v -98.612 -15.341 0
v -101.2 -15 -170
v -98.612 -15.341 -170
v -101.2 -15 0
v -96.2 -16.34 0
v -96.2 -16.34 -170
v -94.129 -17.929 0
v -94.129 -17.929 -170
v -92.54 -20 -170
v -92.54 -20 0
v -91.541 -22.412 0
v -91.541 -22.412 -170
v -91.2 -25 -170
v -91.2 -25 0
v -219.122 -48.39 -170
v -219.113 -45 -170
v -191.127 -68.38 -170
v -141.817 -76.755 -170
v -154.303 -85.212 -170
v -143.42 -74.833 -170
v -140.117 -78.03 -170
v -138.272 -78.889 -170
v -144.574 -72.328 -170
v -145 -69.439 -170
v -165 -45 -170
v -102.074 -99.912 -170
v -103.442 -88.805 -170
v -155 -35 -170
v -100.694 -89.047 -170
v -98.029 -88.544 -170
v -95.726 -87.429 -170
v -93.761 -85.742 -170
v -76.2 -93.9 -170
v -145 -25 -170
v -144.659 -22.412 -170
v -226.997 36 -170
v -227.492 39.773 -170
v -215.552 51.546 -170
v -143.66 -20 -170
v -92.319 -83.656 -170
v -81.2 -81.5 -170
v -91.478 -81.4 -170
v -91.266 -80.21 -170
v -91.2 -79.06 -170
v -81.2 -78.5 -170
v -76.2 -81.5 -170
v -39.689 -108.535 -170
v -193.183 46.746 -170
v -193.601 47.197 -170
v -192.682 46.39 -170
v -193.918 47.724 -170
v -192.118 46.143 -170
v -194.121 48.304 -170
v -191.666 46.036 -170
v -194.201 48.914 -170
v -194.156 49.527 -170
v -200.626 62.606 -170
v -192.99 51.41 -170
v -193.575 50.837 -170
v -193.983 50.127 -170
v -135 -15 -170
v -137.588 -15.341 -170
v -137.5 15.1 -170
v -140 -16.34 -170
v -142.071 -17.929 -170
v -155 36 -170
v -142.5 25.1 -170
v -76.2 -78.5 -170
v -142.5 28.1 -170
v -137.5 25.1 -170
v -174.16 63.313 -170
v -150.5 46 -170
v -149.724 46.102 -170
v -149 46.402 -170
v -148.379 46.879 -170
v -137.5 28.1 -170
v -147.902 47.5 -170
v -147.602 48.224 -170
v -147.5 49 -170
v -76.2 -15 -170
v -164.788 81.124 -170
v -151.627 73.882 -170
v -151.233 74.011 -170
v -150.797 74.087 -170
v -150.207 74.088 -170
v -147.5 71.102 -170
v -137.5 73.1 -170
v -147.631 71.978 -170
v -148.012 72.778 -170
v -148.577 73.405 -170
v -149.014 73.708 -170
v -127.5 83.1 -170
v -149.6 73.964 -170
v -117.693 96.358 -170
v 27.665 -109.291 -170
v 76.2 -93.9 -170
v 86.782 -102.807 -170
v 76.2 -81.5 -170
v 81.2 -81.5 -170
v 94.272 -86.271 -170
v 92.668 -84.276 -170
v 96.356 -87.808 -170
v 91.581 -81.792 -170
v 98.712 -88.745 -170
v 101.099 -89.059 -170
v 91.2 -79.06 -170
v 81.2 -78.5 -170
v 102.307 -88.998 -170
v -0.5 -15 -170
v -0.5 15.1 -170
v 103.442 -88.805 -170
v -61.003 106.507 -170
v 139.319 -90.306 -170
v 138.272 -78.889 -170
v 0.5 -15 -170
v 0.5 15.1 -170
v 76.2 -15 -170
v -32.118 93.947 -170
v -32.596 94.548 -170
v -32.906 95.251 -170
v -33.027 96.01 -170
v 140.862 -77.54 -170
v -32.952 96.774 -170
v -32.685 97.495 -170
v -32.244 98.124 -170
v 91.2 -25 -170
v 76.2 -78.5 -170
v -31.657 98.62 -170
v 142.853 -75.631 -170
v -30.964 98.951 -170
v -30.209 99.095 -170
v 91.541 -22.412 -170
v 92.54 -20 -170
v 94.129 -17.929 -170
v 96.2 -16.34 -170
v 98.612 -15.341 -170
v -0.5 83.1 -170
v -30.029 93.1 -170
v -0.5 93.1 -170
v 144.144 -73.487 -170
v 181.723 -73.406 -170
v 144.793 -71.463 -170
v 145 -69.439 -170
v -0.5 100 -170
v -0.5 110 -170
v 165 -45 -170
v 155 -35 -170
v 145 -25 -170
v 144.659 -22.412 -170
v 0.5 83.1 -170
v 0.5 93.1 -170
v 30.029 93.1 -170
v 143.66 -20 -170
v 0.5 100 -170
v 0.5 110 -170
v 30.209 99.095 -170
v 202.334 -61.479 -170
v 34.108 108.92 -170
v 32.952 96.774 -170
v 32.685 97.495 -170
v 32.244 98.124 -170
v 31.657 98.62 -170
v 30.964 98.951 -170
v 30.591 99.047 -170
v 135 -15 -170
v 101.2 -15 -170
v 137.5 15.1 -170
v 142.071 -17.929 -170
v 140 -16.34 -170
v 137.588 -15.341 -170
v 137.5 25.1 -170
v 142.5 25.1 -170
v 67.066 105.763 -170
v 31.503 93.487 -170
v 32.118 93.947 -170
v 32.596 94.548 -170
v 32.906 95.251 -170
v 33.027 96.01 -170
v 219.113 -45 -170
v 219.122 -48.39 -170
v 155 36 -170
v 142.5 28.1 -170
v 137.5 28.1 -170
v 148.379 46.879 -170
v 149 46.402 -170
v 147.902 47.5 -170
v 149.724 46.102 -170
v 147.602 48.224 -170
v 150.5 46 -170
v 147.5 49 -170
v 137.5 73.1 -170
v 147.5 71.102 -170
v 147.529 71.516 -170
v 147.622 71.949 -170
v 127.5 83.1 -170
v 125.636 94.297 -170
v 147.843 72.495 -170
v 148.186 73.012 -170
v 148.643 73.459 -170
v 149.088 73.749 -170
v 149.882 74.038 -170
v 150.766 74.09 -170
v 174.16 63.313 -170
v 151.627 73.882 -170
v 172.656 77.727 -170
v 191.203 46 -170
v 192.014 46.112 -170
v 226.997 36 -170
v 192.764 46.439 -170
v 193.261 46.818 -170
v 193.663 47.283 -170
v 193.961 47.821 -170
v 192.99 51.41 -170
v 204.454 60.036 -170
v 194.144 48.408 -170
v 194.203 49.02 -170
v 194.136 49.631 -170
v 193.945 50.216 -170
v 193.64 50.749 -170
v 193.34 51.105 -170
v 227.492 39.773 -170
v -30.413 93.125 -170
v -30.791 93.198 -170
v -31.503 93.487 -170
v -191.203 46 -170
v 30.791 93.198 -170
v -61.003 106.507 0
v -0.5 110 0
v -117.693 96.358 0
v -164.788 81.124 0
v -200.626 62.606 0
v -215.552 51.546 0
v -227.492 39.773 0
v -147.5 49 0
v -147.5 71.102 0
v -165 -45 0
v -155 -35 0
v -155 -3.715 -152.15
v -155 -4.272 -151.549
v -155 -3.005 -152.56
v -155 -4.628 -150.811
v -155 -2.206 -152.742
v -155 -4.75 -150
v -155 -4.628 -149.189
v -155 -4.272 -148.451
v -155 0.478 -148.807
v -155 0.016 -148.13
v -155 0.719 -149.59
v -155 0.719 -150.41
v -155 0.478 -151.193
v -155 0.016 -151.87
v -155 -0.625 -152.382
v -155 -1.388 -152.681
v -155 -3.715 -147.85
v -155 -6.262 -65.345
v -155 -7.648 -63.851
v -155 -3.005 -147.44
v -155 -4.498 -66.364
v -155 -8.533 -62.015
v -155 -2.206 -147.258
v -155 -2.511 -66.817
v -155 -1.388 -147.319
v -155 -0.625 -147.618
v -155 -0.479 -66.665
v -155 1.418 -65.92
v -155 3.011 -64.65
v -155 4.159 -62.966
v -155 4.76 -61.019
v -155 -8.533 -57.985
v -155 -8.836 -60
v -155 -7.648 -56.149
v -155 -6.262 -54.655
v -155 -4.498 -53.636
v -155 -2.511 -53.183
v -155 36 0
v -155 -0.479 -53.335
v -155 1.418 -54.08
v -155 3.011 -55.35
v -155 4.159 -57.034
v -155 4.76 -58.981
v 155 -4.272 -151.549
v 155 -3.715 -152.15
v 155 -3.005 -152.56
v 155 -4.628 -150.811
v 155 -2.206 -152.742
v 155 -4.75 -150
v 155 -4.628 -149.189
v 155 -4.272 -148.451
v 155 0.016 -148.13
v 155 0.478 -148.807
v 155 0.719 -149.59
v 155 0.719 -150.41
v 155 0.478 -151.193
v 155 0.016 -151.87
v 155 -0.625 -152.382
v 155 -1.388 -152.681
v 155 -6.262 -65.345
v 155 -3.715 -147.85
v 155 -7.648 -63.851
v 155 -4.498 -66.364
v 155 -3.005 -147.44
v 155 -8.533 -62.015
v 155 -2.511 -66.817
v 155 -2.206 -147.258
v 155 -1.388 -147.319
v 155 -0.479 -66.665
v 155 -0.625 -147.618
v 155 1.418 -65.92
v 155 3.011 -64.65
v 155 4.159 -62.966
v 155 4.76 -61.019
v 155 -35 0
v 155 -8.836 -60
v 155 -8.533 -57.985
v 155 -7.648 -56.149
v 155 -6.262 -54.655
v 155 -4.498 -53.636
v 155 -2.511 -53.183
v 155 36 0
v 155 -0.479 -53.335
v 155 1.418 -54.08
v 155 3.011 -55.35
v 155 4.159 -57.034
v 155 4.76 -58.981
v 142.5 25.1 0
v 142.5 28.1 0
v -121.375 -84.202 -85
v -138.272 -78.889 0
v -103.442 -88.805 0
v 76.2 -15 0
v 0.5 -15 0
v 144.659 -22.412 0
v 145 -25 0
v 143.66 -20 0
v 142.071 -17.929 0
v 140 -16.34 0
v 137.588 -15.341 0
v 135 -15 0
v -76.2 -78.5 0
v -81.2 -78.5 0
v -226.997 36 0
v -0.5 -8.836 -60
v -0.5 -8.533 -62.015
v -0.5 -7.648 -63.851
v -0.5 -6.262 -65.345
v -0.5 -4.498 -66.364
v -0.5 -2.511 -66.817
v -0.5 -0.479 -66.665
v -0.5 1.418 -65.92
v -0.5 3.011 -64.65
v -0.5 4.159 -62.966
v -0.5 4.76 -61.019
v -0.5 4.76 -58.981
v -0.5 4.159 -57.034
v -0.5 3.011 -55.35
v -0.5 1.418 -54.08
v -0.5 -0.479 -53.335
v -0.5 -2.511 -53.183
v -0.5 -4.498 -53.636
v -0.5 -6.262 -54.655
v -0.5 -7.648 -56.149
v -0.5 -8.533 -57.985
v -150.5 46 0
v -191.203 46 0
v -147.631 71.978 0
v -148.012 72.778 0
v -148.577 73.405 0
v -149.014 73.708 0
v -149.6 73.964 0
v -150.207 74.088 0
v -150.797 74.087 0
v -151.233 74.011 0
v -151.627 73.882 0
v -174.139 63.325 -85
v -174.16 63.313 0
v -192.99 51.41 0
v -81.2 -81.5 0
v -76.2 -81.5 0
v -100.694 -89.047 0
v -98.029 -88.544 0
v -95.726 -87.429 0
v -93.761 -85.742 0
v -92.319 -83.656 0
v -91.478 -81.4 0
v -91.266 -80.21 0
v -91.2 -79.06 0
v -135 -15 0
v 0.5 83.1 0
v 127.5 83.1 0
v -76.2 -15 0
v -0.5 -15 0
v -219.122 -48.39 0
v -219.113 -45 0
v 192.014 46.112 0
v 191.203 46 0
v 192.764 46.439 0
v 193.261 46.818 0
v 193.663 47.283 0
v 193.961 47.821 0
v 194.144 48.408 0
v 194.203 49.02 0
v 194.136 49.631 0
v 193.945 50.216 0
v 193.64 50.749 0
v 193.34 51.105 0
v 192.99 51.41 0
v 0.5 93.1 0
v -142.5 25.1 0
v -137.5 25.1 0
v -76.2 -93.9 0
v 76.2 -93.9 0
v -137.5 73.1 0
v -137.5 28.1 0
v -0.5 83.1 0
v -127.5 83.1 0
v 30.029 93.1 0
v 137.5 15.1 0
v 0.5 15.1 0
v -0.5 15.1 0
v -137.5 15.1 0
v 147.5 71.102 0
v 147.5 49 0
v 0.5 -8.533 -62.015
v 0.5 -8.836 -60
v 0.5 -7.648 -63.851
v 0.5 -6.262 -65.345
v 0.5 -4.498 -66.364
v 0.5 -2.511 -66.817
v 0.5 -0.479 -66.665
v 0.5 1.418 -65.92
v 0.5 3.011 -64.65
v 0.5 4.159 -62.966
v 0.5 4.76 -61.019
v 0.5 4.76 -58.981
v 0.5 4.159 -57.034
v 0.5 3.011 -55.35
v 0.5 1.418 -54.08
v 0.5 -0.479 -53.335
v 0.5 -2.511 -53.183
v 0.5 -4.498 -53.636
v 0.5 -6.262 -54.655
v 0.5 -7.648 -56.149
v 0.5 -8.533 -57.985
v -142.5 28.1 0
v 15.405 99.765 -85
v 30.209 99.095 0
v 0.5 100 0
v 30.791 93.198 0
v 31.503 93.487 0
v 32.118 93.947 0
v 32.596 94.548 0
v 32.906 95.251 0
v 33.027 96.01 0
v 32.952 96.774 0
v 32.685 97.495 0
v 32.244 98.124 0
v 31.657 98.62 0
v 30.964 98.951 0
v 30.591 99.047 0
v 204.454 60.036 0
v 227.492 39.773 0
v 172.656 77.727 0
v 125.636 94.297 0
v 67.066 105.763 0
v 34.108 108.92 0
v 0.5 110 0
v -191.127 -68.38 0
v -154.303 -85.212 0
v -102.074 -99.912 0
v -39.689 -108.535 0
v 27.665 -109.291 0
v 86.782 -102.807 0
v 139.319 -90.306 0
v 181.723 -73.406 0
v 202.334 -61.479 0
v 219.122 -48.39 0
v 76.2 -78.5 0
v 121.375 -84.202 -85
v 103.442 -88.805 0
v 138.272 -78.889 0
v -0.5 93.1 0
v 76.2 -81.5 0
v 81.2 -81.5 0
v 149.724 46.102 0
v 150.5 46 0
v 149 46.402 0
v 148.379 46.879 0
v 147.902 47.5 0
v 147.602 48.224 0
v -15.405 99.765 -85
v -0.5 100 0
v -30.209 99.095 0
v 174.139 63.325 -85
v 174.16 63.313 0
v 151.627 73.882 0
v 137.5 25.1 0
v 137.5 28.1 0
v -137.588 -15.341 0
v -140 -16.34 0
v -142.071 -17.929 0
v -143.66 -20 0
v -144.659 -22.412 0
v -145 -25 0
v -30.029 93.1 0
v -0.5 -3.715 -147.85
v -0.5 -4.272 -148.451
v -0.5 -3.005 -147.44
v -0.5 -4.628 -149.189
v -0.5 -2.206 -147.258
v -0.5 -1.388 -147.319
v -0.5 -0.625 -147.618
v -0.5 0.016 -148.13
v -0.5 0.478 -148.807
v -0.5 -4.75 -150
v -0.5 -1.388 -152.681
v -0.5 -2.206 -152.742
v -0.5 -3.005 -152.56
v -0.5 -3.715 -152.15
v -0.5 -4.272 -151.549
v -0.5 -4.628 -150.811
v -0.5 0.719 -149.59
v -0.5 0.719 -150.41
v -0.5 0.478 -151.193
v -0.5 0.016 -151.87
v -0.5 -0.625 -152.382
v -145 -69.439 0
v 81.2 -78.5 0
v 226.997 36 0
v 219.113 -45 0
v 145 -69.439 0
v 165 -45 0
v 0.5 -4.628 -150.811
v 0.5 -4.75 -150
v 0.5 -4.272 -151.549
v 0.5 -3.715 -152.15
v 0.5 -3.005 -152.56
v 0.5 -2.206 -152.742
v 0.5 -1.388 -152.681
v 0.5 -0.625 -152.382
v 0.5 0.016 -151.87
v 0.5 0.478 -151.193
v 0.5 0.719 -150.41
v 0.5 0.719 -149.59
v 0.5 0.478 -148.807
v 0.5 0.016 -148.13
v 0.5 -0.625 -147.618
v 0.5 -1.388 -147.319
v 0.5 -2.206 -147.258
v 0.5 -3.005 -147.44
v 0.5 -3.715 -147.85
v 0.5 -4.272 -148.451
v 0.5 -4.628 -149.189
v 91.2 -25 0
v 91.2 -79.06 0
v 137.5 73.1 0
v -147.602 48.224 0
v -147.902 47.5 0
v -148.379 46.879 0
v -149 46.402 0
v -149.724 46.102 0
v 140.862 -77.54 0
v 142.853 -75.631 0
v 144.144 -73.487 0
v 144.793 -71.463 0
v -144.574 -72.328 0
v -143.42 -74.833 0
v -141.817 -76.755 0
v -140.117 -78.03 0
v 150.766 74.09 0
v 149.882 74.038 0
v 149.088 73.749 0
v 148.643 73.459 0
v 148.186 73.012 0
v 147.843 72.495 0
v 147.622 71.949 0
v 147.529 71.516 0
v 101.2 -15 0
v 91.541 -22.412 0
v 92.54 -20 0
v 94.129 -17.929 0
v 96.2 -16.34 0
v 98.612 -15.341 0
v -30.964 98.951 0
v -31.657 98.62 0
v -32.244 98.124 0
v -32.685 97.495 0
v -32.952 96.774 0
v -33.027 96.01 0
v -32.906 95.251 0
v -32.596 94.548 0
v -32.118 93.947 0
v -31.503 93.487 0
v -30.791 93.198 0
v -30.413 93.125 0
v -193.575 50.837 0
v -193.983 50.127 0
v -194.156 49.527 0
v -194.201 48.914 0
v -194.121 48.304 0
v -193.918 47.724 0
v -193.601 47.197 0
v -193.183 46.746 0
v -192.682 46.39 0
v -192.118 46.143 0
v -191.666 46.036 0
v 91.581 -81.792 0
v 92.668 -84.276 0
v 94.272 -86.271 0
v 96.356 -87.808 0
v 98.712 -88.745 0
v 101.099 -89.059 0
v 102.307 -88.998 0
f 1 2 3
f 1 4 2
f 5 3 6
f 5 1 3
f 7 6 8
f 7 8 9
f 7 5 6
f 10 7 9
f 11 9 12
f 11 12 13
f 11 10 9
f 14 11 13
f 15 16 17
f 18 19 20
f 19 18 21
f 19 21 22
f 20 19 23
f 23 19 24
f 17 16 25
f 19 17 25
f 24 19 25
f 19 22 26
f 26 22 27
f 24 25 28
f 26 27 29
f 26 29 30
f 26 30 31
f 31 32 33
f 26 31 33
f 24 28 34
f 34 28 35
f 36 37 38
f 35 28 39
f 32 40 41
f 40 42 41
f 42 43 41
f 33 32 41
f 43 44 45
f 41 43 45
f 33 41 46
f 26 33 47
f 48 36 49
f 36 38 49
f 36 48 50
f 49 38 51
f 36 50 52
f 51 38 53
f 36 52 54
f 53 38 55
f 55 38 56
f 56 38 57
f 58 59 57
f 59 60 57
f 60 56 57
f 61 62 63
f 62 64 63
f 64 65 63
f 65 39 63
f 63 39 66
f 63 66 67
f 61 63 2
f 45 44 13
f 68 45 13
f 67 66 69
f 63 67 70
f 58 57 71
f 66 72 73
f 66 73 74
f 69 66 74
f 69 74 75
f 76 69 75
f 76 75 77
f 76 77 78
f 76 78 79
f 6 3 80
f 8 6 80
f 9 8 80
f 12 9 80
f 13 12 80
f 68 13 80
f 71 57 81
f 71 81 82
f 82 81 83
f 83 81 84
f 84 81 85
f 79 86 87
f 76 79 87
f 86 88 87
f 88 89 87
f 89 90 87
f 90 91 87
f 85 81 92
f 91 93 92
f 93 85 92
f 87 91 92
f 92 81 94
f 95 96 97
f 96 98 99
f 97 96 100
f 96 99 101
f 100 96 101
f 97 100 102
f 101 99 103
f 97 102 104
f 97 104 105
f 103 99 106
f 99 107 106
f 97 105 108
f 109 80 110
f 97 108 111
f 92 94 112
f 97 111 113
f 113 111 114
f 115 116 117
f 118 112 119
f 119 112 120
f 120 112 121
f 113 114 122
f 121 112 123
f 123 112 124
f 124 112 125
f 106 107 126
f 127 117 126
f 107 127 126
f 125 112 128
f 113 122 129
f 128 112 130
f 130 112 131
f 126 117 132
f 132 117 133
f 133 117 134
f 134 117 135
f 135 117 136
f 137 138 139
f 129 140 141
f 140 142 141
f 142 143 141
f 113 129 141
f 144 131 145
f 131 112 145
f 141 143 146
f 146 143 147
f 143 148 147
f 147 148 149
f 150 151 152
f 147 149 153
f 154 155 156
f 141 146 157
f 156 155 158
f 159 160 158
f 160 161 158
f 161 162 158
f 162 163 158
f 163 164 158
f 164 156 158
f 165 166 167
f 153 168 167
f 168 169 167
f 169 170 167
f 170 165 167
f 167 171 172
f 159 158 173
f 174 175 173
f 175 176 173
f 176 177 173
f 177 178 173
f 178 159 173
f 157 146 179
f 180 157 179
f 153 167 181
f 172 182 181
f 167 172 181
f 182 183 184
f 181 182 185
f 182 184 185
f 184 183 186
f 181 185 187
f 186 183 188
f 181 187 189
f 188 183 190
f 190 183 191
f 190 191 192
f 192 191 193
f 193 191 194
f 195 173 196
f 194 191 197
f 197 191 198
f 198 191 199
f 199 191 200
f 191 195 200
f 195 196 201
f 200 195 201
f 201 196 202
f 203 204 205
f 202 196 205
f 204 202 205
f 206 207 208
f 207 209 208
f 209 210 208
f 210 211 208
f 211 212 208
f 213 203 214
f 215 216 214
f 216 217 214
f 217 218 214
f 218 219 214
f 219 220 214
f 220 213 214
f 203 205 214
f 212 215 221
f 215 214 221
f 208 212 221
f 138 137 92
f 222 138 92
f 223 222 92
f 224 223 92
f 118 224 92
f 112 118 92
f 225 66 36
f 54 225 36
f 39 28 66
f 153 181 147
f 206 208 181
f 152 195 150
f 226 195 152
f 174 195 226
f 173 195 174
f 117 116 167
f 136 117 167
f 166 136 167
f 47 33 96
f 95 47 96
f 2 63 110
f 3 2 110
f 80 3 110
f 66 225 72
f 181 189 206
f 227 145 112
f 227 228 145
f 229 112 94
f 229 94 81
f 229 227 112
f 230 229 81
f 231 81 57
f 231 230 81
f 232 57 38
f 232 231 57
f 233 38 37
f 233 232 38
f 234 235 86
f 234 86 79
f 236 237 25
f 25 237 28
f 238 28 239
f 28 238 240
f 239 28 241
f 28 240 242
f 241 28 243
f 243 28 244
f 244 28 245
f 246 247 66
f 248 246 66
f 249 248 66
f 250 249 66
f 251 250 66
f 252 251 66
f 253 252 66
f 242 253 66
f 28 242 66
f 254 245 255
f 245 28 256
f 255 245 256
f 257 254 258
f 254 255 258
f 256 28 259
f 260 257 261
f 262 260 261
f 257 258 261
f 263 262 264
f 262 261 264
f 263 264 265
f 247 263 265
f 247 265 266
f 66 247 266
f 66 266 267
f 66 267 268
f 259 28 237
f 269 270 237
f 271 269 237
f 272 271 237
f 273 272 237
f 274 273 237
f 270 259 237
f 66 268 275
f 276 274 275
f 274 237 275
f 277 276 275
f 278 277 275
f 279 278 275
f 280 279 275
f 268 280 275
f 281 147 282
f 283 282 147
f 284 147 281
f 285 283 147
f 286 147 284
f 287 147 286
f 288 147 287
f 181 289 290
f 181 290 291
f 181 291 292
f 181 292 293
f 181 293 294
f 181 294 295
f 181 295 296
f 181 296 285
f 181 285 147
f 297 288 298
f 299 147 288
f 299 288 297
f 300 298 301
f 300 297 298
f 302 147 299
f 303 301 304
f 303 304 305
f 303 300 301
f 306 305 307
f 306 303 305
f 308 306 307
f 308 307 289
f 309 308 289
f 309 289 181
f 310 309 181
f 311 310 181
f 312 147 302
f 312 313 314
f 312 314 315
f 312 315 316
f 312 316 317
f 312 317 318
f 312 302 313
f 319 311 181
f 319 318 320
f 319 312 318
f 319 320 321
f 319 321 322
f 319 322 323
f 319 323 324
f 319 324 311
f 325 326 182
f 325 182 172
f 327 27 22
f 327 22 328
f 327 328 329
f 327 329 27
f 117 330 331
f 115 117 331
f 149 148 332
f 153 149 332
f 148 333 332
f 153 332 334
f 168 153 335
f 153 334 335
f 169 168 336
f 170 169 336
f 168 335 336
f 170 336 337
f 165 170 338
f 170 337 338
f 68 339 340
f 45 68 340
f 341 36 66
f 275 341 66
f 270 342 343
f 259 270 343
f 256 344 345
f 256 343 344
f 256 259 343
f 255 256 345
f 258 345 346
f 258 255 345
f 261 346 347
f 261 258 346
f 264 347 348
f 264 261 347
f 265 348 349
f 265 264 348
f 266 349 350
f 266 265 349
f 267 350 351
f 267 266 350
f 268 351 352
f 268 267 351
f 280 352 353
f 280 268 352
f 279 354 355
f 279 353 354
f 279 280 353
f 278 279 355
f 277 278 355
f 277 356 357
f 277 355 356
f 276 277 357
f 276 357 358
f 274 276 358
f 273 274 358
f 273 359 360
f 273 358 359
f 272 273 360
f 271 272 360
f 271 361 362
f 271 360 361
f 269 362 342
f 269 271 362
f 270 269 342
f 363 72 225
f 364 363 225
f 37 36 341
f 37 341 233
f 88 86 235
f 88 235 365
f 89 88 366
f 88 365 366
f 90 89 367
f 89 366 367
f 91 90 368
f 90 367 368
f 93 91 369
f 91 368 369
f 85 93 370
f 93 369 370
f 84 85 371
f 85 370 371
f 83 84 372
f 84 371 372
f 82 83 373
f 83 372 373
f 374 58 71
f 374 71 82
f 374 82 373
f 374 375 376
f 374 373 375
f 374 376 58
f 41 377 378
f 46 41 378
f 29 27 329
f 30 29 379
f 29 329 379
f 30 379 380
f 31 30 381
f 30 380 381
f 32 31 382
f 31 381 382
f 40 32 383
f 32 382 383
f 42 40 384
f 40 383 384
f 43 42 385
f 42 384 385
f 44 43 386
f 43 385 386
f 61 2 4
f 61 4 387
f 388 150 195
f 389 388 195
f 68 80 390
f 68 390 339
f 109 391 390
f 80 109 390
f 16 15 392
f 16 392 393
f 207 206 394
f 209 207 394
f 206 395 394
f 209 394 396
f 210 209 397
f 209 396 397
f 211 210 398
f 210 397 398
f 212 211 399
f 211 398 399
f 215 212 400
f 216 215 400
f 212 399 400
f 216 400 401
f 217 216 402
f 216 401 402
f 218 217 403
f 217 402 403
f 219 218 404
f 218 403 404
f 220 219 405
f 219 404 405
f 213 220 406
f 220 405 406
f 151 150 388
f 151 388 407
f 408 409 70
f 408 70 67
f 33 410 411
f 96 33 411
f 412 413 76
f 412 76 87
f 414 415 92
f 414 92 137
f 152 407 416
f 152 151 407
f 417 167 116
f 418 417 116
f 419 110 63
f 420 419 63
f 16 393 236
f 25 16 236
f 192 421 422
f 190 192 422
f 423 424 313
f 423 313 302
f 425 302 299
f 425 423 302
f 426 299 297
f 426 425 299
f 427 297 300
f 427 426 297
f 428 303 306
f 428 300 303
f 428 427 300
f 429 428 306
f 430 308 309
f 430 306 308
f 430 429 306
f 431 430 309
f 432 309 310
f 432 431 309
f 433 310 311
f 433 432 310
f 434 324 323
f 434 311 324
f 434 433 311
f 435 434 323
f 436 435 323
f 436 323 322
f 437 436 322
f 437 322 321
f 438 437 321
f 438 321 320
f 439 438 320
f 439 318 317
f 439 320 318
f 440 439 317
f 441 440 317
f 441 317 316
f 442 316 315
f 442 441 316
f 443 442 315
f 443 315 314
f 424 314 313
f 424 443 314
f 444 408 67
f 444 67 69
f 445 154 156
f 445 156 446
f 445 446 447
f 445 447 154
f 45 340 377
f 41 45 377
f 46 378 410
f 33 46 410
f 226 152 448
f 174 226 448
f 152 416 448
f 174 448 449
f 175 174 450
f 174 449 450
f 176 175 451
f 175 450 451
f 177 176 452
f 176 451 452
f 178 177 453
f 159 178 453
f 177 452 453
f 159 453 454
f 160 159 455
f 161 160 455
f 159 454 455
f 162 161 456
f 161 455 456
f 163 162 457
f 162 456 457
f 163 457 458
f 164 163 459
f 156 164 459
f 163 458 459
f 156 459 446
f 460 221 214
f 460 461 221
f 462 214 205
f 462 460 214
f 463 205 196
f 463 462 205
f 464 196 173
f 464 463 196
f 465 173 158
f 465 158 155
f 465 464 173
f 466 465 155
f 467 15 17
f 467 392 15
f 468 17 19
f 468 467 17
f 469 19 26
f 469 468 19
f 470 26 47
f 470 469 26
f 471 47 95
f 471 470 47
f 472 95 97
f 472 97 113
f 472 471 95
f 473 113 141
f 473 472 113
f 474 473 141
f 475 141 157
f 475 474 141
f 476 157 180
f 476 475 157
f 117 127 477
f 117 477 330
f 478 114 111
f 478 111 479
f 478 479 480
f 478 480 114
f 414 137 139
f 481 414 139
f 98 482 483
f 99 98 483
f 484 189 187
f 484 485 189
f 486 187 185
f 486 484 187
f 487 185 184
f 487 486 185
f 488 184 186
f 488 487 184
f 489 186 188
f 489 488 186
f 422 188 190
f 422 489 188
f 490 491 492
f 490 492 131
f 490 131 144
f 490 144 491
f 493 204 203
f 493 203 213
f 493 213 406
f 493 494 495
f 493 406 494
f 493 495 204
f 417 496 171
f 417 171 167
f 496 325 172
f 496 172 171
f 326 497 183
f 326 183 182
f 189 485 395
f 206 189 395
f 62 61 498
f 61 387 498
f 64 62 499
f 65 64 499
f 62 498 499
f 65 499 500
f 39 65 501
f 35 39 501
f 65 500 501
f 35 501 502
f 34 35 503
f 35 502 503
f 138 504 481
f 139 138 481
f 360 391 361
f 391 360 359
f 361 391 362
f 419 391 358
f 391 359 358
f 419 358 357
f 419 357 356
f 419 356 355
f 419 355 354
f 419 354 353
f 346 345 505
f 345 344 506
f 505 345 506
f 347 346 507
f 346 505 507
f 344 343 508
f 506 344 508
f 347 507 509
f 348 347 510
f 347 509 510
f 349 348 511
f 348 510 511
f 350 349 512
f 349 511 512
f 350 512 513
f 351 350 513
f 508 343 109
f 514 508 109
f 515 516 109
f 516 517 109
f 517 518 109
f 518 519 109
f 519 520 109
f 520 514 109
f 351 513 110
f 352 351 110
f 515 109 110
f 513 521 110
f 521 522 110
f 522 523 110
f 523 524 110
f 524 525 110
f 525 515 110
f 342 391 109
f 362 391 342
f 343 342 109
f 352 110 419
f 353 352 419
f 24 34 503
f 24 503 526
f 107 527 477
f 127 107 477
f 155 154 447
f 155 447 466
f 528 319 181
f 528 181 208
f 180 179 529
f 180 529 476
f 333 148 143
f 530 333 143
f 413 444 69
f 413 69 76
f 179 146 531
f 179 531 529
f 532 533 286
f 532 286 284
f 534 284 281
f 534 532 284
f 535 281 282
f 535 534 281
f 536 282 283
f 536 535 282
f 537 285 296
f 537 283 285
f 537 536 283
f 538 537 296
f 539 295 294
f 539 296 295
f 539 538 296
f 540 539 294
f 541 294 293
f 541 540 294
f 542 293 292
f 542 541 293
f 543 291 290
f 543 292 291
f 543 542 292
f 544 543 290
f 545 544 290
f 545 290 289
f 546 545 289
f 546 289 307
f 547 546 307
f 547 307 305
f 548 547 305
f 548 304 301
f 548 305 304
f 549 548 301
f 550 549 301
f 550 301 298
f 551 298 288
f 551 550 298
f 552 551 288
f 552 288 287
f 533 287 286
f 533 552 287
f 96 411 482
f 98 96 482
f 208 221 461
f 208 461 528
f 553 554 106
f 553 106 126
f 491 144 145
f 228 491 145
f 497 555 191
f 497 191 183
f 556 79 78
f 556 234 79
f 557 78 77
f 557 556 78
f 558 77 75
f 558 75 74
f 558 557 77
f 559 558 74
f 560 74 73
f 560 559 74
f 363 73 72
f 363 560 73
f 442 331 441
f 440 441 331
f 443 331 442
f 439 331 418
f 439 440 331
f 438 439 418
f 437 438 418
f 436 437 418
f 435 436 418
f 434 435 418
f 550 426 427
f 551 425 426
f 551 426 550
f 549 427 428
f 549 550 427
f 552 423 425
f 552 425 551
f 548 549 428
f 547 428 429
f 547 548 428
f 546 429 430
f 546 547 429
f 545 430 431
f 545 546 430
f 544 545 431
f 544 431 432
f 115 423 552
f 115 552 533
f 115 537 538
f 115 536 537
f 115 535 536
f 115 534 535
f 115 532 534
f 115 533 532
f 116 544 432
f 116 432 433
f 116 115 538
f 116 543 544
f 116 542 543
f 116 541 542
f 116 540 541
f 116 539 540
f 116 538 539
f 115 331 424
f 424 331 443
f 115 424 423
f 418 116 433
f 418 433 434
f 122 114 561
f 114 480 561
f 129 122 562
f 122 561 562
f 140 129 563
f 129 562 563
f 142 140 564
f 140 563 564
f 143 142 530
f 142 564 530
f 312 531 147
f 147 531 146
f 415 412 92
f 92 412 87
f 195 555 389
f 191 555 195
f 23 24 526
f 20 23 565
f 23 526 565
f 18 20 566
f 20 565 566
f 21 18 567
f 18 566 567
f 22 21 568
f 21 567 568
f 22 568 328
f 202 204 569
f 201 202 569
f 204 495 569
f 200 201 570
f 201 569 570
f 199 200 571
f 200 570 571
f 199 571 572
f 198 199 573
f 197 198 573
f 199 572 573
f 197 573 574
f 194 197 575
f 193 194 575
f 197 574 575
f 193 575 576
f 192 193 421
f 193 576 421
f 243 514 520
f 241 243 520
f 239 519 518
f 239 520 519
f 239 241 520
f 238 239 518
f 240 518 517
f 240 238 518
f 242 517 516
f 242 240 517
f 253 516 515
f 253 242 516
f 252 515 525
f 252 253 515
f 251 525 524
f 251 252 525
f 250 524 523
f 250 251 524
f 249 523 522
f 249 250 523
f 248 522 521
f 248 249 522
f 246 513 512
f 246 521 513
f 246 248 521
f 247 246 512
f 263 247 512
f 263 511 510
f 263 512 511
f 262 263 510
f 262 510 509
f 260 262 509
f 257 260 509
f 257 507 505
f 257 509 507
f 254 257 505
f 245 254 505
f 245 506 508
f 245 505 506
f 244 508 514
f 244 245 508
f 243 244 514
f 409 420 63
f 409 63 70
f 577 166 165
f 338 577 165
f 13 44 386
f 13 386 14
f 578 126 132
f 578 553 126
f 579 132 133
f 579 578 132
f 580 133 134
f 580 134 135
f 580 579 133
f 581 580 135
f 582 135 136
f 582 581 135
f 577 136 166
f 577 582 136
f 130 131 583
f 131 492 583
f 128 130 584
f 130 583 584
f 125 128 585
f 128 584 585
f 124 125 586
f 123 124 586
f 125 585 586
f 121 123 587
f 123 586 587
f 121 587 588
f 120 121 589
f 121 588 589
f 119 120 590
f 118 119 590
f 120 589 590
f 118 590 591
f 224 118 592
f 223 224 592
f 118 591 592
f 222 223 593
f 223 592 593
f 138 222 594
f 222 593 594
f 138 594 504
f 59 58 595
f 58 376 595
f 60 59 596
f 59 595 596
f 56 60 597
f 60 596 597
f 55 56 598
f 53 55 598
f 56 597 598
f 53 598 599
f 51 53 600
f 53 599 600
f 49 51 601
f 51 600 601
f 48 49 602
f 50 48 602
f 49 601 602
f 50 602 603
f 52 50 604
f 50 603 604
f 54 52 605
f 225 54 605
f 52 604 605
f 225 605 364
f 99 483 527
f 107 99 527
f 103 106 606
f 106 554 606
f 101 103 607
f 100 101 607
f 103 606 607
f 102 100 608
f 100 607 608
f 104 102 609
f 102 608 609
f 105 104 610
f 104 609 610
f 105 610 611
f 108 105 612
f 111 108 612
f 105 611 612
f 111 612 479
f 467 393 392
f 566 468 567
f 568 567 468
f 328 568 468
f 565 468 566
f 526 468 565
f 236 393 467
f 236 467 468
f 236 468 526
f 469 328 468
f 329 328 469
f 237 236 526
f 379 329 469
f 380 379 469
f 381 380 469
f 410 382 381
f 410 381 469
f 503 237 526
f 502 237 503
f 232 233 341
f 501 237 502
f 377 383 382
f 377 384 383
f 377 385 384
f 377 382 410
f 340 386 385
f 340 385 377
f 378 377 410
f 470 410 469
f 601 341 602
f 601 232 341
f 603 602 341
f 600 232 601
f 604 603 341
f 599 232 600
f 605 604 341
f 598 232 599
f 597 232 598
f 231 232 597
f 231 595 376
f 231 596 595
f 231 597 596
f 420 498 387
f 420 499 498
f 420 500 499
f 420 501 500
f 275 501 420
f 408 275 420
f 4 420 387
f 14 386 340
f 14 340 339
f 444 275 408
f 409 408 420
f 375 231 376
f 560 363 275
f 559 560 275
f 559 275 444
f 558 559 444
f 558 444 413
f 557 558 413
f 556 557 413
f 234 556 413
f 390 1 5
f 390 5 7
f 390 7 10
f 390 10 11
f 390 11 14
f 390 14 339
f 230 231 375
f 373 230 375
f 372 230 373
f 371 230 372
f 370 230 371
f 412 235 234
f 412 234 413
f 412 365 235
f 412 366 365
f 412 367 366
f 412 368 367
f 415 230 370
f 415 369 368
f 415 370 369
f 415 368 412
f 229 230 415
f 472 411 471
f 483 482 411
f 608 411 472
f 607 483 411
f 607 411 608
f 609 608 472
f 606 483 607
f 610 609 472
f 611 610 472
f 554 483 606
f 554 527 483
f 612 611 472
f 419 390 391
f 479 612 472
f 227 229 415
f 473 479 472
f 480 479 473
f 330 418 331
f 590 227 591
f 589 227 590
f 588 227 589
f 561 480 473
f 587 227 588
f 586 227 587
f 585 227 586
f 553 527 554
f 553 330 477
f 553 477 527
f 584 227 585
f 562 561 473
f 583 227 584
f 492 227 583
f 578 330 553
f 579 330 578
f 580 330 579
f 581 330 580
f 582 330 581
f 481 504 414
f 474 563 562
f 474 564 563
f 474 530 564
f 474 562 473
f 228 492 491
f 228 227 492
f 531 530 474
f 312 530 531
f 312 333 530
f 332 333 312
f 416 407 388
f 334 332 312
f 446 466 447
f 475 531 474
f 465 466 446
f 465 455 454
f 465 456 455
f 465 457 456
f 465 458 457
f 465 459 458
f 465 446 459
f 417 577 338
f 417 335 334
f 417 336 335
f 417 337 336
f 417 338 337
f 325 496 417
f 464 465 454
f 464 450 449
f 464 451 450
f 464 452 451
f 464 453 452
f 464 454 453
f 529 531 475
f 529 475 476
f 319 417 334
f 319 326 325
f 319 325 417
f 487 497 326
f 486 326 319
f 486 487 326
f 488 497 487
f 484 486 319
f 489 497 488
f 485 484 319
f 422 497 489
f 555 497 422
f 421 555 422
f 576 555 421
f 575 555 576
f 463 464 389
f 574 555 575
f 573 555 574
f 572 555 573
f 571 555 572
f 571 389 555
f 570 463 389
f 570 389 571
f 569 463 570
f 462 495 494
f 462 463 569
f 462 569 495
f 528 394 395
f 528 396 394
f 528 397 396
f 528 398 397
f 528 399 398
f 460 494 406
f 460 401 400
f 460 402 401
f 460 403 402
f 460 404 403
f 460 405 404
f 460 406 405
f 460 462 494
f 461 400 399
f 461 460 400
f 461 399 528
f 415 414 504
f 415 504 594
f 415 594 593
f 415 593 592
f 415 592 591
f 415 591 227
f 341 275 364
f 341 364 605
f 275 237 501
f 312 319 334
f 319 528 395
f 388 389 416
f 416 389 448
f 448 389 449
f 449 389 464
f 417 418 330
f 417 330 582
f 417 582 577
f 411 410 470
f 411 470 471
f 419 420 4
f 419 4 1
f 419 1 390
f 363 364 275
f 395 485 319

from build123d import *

# Parameters (mm, degrees)
SKETCH1_RX              = 244
SKETCH1_RY              = 110
BOSS_EXTRUDE1_DEPTH     = 170
SKETCH9_W               = 89
SKETCH9_H               = 81
CUT_EXTRUDE4_DEPTH      = 318.074123826
CUT_EXTRUDE5_DEPTH      = 307.853795271
CUT_EXTRUDE6_DEPTH      = 307.853795271
CUT_EXTRUDE6_DEPTH_BACK = 307.853795271
SKETCH11_R              = 6.83635542
SKETCH11_R_2            = 2.75
CHAMFER1_START          = -171
CHAMFER1_DEPTH          = 172
CUT_EXTRUDE7_DEPTH      = 305.55287031
CHAMFER2_SIZE           = 10
CUT_EXTRUDE8_DEPTH      = 305.55287031
CUT_EXTRUDE8_DEPTH_BACK = 305.55287031
SKETCH14_W              = 1
SKETCH14_H              = 125
CUT_EXTRUDE9_DEPTH      = 305.55287044
CUT_EXTRUDE9_DEPTH_BACK = 305.55287044
FILLET1_R               = 10
FILLET2_R               = 3
CHAMFER4_SIZE           = 10


with BuildPart() as part:
    # Sketch1 → Boss-Extrude1 (new body)
    with BuildSketch(Plane.XY):
        with Locations((0, 0)):
            Ellipse(SKETCH1_RX, SKETCH1_RY)
    extrude(amount=-BOSS_EXTRUDE1_DEPTH)

    # Sketch9 → Cut-Extrude4 (cut, through all)
    with BuildSketch(Plane.XY):
        with Locations((199.5, -4.5)):
            Rectangle(SKETCH9_W, SKETCH9_H)
        with Locations((-199.5, -4.5)):
            Rectangle(SKETCH9_W, SKETCH9_H)
    extrude(amount=-CUT_EXTRUDE4_DEPTH, mode=Mode.SUBTRACT)

    # Sketch10 → Cut-Extrude5 (cut, through all)
    with BuildSketch(Plane.XY):
        Polygon((-137.5, 83.1), (137.5, 83.1), (137.5, 28.1), (142.5, 28.1), (142.5, 25.1), (137.5, 25.1), (137.5, 15.1), (-137.5, 15.1), (-137.5, 25.1), (-142.5, 25.1), (-142.5, 28.1), (-137.5, 28.1), align=None)
    extrude(amount=-CUT_EXTRUDE5_DEPTH, mode=Mode.SUBTRACT)

    # Sketch11 → Cut-Extrude6 (cut, two sides: drawn at the far end of the back side and taken through both)
    with BuildSketch(Plane(origin=(0, 0, 0), x_dir=(0, 0, -1), z_dir=(1, 0, 0)).offset(-CUT_EXTRUDE6_DEPTH_BACK)):
        with Locations(Location((60, -2, 0), (0, 0, 270))):
            Circle(SKETCH11_R)
        with Locations(Location((150, -2, 0), (0, 0, 270))):
            Circle(SKETCH11_R_2)
    extrude(amount=CUT_EXTRUDE6_DEPTH + CUT_EXTRUDE6_DEPTH_BACK, mode=Mode.SUBTRACT)

    # Chamfer1: read off the stored shape, not the designer's step
    # Chamfer1 outline → Chamfer1 (cut)
    with BuildSketch(Plane.XY.offset(CHAMFER1_START)):
        with BuildLine():
            add(Edge.make_bspline(
                [(230.562901548, 36), (229.103745792, 37.899303194), (227.491649987, 39.773306403)],
                knots=[0.33341591, 0.33341591, 0.33341591, 0.380657268, 0.380657268, 0.380657268], degree=2, weights=[1, 0.987158133, 0.974806549]))
            Line((227.491649987, 39.773306403), (226.997134148, 36))
            Line((226.997134148, 36), (230.562901548, 36))
        make_face()
        with BuildLine():
            Line((-226.997134148, 36), (-227.491649987, 39.773306403))
            add(Edge.make_bspline(
                [(-227.491649987, 39.773306403), (-229.103745792, 37.899303194), (-230.562901548, 36)],
                knots=[2.760935386, 2.760935386, 2.760935386, 2.808176743, 2.808176743, 2.808176743], degree=2, weights=[0.974806549, 0.987158133, 1]))
            Line((-230.562901548, 36), (-226.997134148, 36))
        make_face()
        with BuildLine():
            add(Edge.make_bspline(
                [(-222.648446162, -45), (-220.94937929, -46.708532895), (-219.122315767, -48.390007394)],
                knots=[3.563050222, 3.563050222, 3.563050222, 3.605462156, 3.605462156, 3.605462156], degree=2, weights=[1, 0.989097384, 0.978597088]))
            Line((-219.122315767, -48.390007394), (-219.112898615, -45))
            Line((-219.112898615, -45), (-222.648446162, -45))
        make_face()
        with BuildLine():
            Line((219.112898615, -45), (219.122315767, -48.390007394))
            add(Edge.make_bspline(
                [(219.122315767, -48.390007394), (220.94937929, -46.708532895), (222.648446162, -45)],
                knots=[5.819315805, 5.819315805, 5.819315805, 5.861727739, 5.861727739, 5.861727739], degree=2, weights=[0.978597088, 0.989097384, 1]))
            Line((222.648446162, -45), (219.112898615, -45))
        make_face()
    extrude(amount=CHAMFER1_DEPTH, mode=Mode.SUBTRACT)

    # Sketch13 → Cut-Extrude7 (cut, through all)
    with BuildSketch(Plane.XY):
        Polygon((-76.2, -81.5), (-76.2, -93.9), (76.2, -93.9), (76.2, -81.5), (81.2, -81.5), (81.2, -78.5), (76.2, -78.5), (76.2, -15), (-76.2, -15), (-76.2, -78.5), (-81.2, -78.5), (-81.2, -81.5), align=None)
    extrude(amount=-CUT_EXTRUDE7_DEPTH, mode=Mode.SUBTRACT)

    # Chamfer2
    chamfer2_edges = [part.edges().sort_by_distance(p)[0] for p in [
        (155, -45, -85),
        (-155, -45, -85),
    ]]
    chamfer(chamfer2_edges, length=CHAMFER2_SIZE)

    # Sketch14 → Cut-Extrude8 (cut, two sides: drawn at the far end of the back side and taken through both)
    with BuildSketch(Plane.XY.offset(-CUT_EXTRUDE8_DEPTH_BACK)):
        with Locations((0, 47.5)):
            Rectangle(SKETCH14_W, SKETCH14_H)
    extrude(amount=CUT_EXTRUDE8_DEPTH + CUT_EXTRUDE8_DEPTH_BACK, mode=Mode.SUBTRACT)

    # Sketch15 → Cut-Extrude9 (cut, two sides: drawn at the far end of the back side and taken through both)
    with BuildSketch(Plane.XY.offset(-CUT_EXTRUDE9_DEPTH_BACK)):
        with BuildLine():
            Line((147.5, 75.514694834), (147.5, 46))
            Line((147.5, 46), (199.781755924, 46))
            add(Edge.make_bspline(
                [(199.781755924, 46), (179.990233789, 62.979001801), (147.5, 75.514694834)],
                knots=[3.619587852, 3.619587852, 3.619587852, 3.997470903, 3.997470903, 3.997470903], degree=2, weights=[1, 0.982203587, 1]))
        make_face()
        with BuildLine():
            Line((91.2, -91.41689608), (91.2, -15))
            Line((91.2, -15), (145, -15))
            Line((145, -15), (145, -76.465113485))
            add(Edge.make_bspline(
                [(91.2, -91.41689608), (120.495747781, -85.643811522), (145, -76.465113485)],
                knots=[1.988139758, 1.988139758, 1.988139758, 2.27109284, 2.27109284, 2.27109284], degree=2, weights=[1, 0.990008876, 1]))
        make_face()
        with BuildLine():
            Line((-82.129314955, 93.1), (82.129314955, 93.1))
            add(Edge.make_bspline(
                [(82.129314955, 93.1), (0, 107.411385607), (-82.129314955, 93.1)],
                knots=[4.338735578, 4.338735578, 4.338735578, 5.086042382, 5.086042382, 5.086042382], degree=2, weights=[1, 0.931, 1]))
        make_face()
        with BuildLine():
            Line((-91.2, -91.41689608), (-91.2, -15))
            Line((-91.2, -15), (-145, -15))
            Line((-145, -15), (-145, -76.465113485))
            add(Edge.make_bspline(
                [(-145, -76.465113485), (-120.495747781, -85.643811522), (-91.2, -91.41689608)],
                knots=[0.870499814, 0.870499814, 0.870499814, 1.153452896, 1.153452896, 1.153452896], degree=2, weights=[1, 0.990008876, 1]))
        make_face()
        with BuildLine():
            Line((-147.5, 75.514694834), (-147.5, 46))
            Line((-147.5, 46), (-199.781755924, 46))
            add(Edge.make_bspline(
                [(-147.5, 75.514694834), (-179.990233789, 62.979001801), (-199.781755924, 46)],
                knots=[5.427307058, 5.427307058, 5.427307058, 5.805190109, 5.805190109, 5.805190109], degree=2, weights=[1, 0.982203587, 1]))
        make_face()
    extrude(amount=CUT_EXTRUDE9_DEPTH + CUT_EXTRUDE9_DEPTH_BACK, mode=Mode.SUBTRACT)

    # Fillet1
    fillet1_edges = [part.edges().sort_by_distance(p)[0] for p in [
        (-145, -15, -85),
        (-145, -76.465113485, -85),
        (-91.2, -91.41689608, -85),
        (145, -76.465113485, -85),
        (91.2, -91.41689608, -85),
        (91.2, -15, -85),
        (-91.2, -15, -85),
        (145, -15, -85),
    ]]
    fillet(fillet1_edges, radius=FILLET1_R)

    # Fillet2
    fillet2_edges = [part.edges().sort_by_distance(p)[0] for p in [
        (-82.129314955, 93.1, -85),
        (82.129314955, 93.1, -85),
        (199.781755924, 46, -85),
        (147.5, 75.514694834, -85),
        (147.5, 46, -85),
        (-147.5, 75.514694834, -85),
        (-147.5, 46, -85),
        (-199.781755924, 46, -85),
    ]]
    fillet(fillet2_edges, radius=FILLET2_R)

    # Chamfer4
    chamfer4_edges = [part.edges().sort_by_distance(p)[0] for p in [
        (-137.5, 83.1, -85),
        (137.5, 83.1, -85),
    ]]
    chamfer(chamfer4_edges, length=CHAMFER4_SIZE)


solid = part.part
